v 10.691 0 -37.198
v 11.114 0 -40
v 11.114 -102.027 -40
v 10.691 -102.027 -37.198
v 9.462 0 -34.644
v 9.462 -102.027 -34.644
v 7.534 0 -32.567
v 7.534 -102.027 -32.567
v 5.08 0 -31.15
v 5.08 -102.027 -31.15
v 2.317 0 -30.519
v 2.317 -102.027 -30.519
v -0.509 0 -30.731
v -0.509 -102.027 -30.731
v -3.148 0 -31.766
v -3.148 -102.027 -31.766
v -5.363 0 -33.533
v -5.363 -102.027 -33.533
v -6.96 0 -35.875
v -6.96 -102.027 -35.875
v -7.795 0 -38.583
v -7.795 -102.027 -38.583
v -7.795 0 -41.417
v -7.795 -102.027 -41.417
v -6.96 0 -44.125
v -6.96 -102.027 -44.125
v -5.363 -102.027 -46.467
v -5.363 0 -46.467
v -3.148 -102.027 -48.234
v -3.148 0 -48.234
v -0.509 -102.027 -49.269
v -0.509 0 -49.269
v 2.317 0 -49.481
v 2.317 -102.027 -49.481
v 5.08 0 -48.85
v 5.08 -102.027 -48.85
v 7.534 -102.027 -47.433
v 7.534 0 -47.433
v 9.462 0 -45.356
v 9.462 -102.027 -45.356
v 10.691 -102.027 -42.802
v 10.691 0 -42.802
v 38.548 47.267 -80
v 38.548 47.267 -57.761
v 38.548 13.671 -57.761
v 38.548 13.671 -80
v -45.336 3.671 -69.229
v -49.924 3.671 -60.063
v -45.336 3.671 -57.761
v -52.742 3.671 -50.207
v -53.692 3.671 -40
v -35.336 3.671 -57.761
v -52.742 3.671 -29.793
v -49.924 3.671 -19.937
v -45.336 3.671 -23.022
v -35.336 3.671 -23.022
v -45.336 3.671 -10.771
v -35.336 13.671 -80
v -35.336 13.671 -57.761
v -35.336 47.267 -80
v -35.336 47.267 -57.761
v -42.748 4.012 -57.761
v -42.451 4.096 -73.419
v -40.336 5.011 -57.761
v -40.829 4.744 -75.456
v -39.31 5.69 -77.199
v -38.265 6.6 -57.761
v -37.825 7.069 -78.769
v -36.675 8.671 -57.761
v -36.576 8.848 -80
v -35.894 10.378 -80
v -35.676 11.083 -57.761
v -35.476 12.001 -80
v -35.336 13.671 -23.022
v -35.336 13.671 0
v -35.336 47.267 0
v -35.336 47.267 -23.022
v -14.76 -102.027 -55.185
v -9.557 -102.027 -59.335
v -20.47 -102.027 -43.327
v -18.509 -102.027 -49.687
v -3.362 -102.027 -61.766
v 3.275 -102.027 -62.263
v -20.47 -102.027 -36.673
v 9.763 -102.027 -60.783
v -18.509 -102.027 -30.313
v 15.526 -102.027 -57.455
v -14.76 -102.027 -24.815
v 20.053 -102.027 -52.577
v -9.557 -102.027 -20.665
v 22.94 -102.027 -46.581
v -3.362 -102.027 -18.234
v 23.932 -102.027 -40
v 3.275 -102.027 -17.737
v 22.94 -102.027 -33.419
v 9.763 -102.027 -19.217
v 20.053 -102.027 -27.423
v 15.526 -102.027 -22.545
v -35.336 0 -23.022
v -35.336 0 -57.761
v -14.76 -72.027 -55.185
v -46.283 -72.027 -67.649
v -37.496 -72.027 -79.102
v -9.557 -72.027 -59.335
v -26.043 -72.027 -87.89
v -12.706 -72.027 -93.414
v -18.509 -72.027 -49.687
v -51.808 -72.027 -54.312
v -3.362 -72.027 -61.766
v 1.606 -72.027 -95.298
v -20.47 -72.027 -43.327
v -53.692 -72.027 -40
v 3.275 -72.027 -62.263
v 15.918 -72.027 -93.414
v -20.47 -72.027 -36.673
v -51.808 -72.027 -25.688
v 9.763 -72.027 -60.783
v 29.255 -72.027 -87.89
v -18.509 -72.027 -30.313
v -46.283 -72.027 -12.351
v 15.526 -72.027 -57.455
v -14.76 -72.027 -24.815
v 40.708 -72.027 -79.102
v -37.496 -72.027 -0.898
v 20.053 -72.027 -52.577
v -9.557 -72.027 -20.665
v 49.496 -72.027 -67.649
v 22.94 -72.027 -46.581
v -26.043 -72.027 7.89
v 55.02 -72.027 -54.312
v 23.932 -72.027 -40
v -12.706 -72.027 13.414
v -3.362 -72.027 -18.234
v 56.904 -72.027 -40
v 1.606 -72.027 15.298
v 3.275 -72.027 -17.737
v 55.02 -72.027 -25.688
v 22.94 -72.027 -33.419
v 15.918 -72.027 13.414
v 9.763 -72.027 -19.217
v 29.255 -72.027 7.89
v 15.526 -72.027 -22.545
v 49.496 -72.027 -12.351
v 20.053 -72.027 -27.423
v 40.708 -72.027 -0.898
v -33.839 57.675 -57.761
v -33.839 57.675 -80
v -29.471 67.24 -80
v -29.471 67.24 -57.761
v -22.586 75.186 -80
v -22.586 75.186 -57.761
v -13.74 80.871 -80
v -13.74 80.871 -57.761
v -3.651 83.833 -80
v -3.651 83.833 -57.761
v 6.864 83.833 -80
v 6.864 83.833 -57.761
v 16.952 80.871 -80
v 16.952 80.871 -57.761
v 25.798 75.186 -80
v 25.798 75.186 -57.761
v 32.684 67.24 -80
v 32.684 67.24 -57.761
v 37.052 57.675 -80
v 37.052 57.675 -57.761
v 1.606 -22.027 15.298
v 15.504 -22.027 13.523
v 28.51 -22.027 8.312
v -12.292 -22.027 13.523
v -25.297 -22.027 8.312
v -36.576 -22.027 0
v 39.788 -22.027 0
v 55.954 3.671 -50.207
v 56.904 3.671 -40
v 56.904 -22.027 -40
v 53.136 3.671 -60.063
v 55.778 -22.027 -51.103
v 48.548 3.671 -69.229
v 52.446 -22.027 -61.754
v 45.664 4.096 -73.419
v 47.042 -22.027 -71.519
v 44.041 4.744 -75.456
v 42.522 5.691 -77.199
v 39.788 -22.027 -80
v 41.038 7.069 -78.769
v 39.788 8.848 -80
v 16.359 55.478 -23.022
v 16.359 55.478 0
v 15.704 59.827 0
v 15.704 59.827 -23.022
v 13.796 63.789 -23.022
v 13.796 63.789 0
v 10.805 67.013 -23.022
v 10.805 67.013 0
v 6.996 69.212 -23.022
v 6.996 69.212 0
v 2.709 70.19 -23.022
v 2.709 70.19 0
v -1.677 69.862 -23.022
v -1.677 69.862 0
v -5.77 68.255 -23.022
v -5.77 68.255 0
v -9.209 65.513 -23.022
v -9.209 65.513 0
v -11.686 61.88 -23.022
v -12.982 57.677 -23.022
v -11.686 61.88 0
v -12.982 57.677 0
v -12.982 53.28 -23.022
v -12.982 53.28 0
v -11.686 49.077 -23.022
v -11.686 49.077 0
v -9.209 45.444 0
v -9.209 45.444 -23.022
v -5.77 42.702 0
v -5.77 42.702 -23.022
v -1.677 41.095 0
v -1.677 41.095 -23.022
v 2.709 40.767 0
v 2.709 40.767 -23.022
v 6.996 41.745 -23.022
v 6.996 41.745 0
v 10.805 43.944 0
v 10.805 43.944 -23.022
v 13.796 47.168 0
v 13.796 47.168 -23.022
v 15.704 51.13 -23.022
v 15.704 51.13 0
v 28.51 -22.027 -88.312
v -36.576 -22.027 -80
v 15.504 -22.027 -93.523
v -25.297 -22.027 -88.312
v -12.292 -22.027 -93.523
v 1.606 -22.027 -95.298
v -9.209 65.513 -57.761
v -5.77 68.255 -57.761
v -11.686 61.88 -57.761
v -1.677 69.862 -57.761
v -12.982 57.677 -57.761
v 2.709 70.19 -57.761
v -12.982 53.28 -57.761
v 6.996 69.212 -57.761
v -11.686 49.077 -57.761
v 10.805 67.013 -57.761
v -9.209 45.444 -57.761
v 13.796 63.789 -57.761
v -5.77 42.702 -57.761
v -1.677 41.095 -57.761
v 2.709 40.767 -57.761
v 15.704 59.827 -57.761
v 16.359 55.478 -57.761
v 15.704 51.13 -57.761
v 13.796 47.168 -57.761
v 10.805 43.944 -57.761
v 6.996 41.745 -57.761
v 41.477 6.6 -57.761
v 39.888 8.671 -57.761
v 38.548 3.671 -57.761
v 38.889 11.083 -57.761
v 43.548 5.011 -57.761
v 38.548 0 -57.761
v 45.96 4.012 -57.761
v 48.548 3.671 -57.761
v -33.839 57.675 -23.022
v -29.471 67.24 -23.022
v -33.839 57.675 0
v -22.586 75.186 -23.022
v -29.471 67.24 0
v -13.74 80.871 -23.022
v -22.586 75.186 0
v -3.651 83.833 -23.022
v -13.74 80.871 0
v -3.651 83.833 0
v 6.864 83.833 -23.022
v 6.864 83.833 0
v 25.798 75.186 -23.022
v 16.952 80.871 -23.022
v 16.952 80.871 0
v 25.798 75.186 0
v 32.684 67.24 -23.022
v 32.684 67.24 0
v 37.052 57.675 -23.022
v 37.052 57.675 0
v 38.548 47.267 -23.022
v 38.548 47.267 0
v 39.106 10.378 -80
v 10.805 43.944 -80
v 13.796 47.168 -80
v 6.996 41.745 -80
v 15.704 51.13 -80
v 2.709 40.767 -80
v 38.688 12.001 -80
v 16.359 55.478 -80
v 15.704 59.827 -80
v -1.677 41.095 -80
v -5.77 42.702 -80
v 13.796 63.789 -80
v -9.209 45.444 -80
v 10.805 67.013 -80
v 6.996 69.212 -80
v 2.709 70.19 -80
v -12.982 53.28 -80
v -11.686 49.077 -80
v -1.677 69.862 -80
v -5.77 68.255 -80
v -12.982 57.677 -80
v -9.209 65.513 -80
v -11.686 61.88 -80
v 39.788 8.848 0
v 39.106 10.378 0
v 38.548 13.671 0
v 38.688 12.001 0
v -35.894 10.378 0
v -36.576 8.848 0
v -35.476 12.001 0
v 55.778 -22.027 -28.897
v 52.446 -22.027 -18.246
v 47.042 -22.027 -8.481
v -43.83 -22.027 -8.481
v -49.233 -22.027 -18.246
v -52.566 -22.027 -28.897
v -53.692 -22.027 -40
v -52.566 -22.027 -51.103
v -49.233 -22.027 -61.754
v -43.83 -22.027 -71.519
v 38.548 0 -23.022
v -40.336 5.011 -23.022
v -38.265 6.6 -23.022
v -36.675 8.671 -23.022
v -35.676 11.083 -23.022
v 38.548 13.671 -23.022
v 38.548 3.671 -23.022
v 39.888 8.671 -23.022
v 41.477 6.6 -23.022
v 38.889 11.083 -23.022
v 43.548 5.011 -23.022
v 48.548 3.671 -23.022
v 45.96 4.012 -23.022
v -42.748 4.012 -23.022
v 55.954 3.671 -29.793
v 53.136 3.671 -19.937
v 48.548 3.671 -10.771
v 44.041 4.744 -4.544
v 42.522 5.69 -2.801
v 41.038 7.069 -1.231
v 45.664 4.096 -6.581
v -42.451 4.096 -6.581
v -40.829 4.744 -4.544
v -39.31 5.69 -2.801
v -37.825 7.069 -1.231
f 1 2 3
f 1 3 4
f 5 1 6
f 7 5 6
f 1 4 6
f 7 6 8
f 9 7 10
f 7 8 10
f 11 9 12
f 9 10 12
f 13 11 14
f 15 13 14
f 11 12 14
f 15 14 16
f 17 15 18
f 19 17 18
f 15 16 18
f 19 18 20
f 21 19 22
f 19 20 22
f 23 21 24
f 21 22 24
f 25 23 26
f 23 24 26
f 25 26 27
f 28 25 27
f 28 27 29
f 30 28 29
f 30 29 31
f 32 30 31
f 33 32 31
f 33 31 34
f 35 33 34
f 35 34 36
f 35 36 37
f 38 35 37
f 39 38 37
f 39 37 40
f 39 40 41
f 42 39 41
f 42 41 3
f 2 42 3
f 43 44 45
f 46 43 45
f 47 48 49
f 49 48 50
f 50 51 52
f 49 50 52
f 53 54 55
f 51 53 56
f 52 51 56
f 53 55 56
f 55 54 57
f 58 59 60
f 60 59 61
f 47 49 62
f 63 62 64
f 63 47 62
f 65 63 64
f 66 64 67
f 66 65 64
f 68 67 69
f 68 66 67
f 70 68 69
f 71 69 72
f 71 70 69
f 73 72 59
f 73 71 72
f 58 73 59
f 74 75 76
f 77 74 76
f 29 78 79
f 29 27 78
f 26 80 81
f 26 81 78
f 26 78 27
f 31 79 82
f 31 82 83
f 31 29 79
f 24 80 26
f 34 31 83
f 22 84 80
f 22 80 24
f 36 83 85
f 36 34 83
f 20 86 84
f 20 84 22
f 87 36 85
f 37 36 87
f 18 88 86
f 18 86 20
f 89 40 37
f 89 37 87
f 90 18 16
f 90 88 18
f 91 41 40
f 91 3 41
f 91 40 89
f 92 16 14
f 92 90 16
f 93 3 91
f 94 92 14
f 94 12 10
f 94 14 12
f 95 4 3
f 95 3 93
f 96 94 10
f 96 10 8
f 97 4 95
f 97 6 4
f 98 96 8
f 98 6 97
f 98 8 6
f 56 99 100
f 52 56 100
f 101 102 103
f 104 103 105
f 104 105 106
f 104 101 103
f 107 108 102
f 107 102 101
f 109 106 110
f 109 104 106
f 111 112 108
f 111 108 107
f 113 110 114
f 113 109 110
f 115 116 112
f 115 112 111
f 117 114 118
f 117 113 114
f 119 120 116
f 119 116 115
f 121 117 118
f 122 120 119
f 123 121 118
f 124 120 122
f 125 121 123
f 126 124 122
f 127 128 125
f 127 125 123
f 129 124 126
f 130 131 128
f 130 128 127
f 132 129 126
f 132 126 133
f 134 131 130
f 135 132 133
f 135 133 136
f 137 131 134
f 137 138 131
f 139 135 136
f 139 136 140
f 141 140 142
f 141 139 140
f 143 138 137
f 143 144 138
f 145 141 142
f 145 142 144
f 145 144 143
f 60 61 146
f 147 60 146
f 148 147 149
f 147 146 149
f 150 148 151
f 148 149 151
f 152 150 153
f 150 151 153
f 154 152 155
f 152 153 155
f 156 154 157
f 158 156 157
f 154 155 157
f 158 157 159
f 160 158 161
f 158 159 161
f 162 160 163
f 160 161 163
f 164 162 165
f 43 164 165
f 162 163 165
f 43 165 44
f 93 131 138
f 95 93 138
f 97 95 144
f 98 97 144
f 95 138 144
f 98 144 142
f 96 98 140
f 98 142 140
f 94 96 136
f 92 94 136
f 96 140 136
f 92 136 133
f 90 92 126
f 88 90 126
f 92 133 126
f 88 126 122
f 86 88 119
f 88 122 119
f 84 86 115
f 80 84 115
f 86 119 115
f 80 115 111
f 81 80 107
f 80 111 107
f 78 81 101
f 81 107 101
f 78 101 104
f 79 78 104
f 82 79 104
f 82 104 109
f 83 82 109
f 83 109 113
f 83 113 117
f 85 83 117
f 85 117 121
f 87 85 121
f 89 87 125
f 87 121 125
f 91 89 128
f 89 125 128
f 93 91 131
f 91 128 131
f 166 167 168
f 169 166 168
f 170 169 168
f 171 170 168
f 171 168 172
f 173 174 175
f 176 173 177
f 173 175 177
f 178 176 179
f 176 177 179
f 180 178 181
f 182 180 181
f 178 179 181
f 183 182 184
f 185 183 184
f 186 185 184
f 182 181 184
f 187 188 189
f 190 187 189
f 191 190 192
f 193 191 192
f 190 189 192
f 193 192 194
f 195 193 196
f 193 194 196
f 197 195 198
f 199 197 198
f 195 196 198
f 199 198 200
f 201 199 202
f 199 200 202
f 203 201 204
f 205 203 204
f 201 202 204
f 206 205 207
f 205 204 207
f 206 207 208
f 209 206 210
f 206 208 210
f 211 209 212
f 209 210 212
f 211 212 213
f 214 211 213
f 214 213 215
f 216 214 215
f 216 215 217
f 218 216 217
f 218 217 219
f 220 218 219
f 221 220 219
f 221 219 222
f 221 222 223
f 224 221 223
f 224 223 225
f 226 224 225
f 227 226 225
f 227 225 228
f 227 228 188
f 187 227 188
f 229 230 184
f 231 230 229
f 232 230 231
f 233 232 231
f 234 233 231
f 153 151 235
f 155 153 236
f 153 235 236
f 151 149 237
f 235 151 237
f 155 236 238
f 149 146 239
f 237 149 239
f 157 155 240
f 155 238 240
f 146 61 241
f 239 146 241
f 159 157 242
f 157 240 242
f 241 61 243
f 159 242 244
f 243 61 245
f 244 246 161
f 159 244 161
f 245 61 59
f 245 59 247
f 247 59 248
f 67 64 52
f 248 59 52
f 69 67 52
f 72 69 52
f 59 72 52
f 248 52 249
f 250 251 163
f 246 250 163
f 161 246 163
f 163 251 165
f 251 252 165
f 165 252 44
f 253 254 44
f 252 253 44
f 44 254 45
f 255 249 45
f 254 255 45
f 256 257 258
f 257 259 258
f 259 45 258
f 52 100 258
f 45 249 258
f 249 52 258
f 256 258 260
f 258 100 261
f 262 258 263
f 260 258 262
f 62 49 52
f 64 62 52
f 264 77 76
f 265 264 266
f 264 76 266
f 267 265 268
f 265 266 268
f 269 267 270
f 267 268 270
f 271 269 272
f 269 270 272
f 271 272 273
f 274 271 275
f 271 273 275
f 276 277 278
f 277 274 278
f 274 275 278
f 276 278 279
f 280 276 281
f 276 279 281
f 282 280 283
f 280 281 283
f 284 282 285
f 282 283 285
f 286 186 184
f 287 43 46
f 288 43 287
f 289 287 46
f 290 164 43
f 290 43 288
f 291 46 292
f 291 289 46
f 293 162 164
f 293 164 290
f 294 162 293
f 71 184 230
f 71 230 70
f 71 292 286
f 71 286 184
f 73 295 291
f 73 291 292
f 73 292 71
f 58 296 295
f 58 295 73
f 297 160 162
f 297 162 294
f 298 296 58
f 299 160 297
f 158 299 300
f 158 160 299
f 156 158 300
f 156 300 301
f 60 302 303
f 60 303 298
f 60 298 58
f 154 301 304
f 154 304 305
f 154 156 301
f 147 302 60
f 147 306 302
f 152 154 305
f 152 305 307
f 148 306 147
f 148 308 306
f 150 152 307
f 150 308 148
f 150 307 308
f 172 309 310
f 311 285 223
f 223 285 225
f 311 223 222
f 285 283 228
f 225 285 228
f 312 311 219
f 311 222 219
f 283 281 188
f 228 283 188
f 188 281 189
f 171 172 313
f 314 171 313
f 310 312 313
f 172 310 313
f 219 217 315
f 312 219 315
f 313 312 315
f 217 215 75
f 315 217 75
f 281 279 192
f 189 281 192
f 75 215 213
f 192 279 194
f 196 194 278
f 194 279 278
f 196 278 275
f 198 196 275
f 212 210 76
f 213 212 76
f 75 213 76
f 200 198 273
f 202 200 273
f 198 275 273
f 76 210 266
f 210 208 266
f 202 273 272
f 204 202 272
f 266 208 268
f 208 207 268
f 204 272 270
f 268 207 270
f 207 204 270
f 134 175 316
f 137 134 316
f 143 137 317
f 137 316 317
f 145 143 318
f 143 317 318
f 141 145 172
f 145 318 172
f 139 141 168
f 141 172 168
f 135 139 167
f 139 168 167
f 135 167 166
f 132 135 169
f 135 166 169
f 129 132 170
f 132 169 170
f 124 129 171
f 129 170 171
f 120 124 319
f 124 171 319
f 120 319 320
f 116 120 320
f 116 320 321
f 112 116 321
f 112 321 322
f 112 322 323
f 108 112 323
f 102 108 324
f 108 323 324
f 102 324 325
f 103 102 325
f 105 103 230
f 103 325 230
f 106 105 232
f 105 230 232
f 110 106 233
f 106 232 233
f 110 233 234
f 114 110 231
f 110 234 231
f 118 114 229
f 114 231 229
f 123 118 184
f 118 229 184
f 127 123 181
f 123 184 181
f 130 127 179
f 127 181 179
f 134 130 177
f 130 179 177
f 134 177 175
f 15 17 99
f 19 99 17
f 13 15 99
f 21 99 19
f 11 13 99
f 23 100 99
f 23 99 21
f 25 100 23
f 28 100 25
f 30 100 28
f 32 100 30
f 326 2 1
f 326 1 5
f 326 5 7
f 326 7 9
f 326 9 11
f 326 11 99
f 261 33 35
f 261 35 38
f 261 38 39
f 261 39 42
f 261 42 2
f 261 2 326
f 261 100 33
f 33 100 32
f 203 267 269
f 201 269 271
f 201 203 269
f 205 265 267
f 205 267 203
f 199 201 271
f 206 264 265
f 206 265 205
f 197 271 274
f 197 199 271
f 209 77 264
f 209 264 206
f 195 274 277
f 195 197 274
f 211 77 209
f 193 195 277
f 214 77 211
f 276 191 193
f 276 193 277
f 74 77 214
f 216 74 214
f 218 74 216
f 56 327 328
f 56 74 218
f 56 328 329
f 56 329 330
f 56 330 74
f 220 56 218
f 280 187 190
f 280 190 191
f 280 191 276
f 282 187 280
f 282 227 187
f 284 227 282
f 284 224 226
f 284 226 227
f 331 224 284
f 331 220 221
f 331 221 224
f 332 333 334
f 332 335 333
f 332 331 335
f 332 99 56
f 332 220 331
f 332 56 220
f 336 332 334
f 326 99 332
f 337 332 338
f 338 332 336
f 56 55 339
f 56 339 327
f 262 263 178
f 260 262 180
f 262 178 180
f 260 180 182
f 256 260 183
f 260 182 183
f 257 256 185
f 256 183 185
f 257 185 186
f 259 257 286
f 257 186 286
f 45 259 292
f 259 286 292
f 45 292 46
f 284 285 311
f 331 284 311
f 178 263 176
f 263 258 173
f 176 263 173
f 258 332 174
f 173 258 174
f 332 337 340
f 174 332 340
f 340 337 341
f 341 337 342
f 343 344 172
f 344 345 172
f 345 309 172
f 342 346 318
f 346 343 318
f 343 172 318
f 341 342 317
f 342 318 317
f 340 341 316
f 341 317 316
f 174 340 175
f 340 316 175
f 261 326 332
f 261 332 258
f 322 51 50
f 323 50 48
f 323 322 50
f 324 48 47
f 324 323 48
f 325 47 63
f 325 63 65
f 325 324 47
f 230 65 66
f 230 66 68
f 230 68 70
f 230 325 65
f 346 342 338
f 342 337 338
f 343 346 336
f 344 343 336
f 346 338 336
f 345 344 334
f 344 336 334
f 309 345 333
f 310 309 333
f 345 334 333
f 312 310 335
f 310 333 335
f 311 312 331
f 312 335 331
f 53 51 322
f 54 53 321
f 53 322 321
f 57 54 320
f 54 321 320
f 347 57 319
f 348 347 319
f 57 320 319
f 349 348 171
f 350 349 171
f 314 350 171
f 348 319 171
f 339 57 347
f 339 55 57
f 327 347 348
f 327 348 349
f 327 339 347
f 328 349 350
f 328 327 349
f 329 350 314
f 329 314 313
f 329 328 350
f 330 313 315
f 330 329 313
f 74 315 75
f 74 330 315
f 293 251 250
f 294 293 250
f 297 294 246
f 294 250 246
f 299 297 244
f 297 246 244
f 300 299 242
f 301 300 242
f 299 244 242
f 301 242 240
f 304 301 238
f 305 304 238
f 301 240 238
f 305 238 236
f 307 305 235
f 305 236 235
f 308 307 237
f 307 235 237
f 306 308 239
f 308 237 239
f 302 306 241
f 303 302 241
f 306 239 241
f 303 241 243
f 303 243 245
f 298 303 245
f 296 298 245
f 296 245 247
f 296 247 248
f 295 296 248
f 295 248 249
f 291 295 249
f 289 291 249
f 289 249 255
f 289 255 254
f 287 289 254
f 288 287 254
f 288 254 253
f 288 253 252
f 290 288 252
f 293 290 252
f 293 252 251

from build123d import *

# Parameters (mm, degrees)
BOSS_EXTRUDE1_DEPTH = 80
SKETCH2_R           = 14.752980174
CUT_EXTRUDE1_DEPTH  = 80
SKETCH3_R           = 55.298116799
BOSS_EXTRUDE2_DEPTH = 50
SKETCH4_R           = 22.325866005
BOSS_EXTRUDE3_DEPTH = 30
CUT_EXTRUDE2_DEPTH  = 30
CUT_EXTRUDE3_DEPTH  = 30
CUT_EXTRUDE4_DEPTH  = 30
CUT_EXTRUDE5_DEPTH  = 30
SKETCH11_W          = 73.883790911
SKETCH11_H          = 34.739224631
CUT_EXTRUDE9_DEPTH  = 110
FILLET1_R           = 10
SKETCH12_R          = 9.507720781
CUT_EXTRUDE10_DEPTH = 110


with BuildPart() as part:
    # Sketch1 → Boss-Extrude1 (new body)
    with BuildSketch(Plane.XY):
        with BuildLine():
            Line((-53.691947432, 3.671244269), (-35.335726088, 3.671244269))
            Line((-35.335726088, 3.671244269), (-35.335726088, 47.267269961))
            ThreePointArc((-35.335726088, 47.267269961), (1.606169368, 84.209165417), (38.548064823, 47.267269961))
            Line((38.548064823, 47.267269961), (38.548064823, 3.671244269))
            Line((38.548064823, 3.671244269), (56.904286167, 3.671244269))
            Line((56.904286167, 3.671244269), (56.904286167, -22.027465613))
            Line((56.904286167, -22.027465613), (-53.691947432, -22.027465613))
            Line((-53.691947432, -22.027465613), (-53.691947432, 3.671244269))
        make_face()
    extrude(amount=-BOSS_EXTRUDE1_DEPTH)

    # Sketch2 → Cut-Extrude1 (cut)
    with BuildSketch(Plane.XY):
        with Locations((1.606169368, 55.478429373)):
            Circle(SKETCH2_R)
    extrude(amount=-CUT_EXTRUDE1_DEPTH, mode=Mode.SUBTRACT)

    # Sketch3 → Boss-Extrude2 (add)
    with BuildSketch(Plane.XZ.offset(22.027465613)):
        with Locations((1.606169368, -40)):
            Circle(SKETCH3_R)
    extrude(amount=BOSS_EXTRUDE2_DEPTH)

    # Sketch4 → Boss-Extrude3 (add)
    with BuildSketch(Plane.XZ.offset(72.027465613)):
        with Locations((1.606169368, -40)):
            Circle(SKETCH4_R)
    extrude(amount=BOSS_EXTRUDE3_DEPTH)

    # Sketch5 → Cut-Extrude2 (cut)
    with BuildSketch(Plane.XZ.offset(22.027465613)):
        with BuildLine():
            Line((-36.57604798, 0), (-53.691947432, 0))
            Line((-53.691947432, 0), (-53.691947432, -40))
            ThreePointArc((-53.691947432, -40), (-49.233217116, -18.245954318), (-36.57604798, 0))
        make_face()
    extrude(amount=-CUT_EXTRUDE2_DEPTH, mode=Mode.SUBTRACT)

    # Sketch6 → Cut-Extrude3 (cut)
    with BuildSketch(Plane.XZ.offset(22.027465613)):
        with BuildLine():
            Line((-36.57604798, -80), (-53.691947432, -80))
            Line((-53.691947432, -80), (-53.691947432, -40))
            ThreePointArc((-53.691947432, -40), (-49.233217116, -61.754045682), (-36.57604798, -80))
        make_face()
    extrude(amount=-CUT_EXTRUDE3_DEPTH, mode=Mode.SUBTRACT)

    # Sketch7 → Cut-Extrude4 (cut)
    with BuildSketch(Plane.XZ.offset(22.027465613)):
        with BuildLine():
            Line((56.904286167, -40), (56.904286167, 0))
            Line((56.904286167, 0), (39.788386715, 0))
            ThreePointArc((39.788386715, 0), (52.445555851, -18.245954318), (56.904286167, -40))
        make_face()
    extrude(amount=-CUT_EXTRUDE4_DEPTH, mode=Mode.SUBTRACT)

    # Sketch8 → Cut-Extrude5 (cut)
    with BuildSketch(Plane.XZ.offset(22.027465613)):
        with BuildLine():
            Line((39.788386715, -80), (56.904286167, -80))
            Line((56.904286167, -80), (56.904286167, -40))
            ThreePointArc((56.904286167, -40), (52.445555851, -61.754045682), (39.788386715, -80))
        make_face()
    extrude(amount=-CUT_EXTRUDE5_DEPTH, mode=Mode.SUBTRACT)

    # Sketch11 → Cut-Extrude9 (cut)
    with BuildSketch(Plane(origin=(0, 0, 0), x_dir=(1, 0, 0), z_dir=(0, 1, 0))):
        with Locations((1.606169368, 40.391795767)):
            Rectangle(SKETCH11_W, SKETCH11_H)
    extrude(amount=CUT_EXTRUDE9_DEPTH, mode=Mode.SUBTRACT)

    # Fillet1
    fillet1_edges = [part.edges().sort_by_distance(p)[0] for p in [
        (-35.335726088, 3.671244269, -68.880704041),
        (38.548064823, 3.671244269, -68.880704041),
        (38.548064823, 3.671244269, -11.511091725),
        (-35.335726088, 3.671244269, -11.511091725),
    ]]
    fillet(fillet1_edges, radius=FILLET1_R)

    # Sketch12 → Cut-Extrude10 (cut)
    with BuildSketch(Plane.XZ.offset(102.027465613)):
        with Locations((1.606169368, -40)):
            Circle(SKETCH12_R)
    extrude(amount=-CUT_EXTRUDE10_DEPTH, mode=Mode.SUBTRACT)


solid = part.part
